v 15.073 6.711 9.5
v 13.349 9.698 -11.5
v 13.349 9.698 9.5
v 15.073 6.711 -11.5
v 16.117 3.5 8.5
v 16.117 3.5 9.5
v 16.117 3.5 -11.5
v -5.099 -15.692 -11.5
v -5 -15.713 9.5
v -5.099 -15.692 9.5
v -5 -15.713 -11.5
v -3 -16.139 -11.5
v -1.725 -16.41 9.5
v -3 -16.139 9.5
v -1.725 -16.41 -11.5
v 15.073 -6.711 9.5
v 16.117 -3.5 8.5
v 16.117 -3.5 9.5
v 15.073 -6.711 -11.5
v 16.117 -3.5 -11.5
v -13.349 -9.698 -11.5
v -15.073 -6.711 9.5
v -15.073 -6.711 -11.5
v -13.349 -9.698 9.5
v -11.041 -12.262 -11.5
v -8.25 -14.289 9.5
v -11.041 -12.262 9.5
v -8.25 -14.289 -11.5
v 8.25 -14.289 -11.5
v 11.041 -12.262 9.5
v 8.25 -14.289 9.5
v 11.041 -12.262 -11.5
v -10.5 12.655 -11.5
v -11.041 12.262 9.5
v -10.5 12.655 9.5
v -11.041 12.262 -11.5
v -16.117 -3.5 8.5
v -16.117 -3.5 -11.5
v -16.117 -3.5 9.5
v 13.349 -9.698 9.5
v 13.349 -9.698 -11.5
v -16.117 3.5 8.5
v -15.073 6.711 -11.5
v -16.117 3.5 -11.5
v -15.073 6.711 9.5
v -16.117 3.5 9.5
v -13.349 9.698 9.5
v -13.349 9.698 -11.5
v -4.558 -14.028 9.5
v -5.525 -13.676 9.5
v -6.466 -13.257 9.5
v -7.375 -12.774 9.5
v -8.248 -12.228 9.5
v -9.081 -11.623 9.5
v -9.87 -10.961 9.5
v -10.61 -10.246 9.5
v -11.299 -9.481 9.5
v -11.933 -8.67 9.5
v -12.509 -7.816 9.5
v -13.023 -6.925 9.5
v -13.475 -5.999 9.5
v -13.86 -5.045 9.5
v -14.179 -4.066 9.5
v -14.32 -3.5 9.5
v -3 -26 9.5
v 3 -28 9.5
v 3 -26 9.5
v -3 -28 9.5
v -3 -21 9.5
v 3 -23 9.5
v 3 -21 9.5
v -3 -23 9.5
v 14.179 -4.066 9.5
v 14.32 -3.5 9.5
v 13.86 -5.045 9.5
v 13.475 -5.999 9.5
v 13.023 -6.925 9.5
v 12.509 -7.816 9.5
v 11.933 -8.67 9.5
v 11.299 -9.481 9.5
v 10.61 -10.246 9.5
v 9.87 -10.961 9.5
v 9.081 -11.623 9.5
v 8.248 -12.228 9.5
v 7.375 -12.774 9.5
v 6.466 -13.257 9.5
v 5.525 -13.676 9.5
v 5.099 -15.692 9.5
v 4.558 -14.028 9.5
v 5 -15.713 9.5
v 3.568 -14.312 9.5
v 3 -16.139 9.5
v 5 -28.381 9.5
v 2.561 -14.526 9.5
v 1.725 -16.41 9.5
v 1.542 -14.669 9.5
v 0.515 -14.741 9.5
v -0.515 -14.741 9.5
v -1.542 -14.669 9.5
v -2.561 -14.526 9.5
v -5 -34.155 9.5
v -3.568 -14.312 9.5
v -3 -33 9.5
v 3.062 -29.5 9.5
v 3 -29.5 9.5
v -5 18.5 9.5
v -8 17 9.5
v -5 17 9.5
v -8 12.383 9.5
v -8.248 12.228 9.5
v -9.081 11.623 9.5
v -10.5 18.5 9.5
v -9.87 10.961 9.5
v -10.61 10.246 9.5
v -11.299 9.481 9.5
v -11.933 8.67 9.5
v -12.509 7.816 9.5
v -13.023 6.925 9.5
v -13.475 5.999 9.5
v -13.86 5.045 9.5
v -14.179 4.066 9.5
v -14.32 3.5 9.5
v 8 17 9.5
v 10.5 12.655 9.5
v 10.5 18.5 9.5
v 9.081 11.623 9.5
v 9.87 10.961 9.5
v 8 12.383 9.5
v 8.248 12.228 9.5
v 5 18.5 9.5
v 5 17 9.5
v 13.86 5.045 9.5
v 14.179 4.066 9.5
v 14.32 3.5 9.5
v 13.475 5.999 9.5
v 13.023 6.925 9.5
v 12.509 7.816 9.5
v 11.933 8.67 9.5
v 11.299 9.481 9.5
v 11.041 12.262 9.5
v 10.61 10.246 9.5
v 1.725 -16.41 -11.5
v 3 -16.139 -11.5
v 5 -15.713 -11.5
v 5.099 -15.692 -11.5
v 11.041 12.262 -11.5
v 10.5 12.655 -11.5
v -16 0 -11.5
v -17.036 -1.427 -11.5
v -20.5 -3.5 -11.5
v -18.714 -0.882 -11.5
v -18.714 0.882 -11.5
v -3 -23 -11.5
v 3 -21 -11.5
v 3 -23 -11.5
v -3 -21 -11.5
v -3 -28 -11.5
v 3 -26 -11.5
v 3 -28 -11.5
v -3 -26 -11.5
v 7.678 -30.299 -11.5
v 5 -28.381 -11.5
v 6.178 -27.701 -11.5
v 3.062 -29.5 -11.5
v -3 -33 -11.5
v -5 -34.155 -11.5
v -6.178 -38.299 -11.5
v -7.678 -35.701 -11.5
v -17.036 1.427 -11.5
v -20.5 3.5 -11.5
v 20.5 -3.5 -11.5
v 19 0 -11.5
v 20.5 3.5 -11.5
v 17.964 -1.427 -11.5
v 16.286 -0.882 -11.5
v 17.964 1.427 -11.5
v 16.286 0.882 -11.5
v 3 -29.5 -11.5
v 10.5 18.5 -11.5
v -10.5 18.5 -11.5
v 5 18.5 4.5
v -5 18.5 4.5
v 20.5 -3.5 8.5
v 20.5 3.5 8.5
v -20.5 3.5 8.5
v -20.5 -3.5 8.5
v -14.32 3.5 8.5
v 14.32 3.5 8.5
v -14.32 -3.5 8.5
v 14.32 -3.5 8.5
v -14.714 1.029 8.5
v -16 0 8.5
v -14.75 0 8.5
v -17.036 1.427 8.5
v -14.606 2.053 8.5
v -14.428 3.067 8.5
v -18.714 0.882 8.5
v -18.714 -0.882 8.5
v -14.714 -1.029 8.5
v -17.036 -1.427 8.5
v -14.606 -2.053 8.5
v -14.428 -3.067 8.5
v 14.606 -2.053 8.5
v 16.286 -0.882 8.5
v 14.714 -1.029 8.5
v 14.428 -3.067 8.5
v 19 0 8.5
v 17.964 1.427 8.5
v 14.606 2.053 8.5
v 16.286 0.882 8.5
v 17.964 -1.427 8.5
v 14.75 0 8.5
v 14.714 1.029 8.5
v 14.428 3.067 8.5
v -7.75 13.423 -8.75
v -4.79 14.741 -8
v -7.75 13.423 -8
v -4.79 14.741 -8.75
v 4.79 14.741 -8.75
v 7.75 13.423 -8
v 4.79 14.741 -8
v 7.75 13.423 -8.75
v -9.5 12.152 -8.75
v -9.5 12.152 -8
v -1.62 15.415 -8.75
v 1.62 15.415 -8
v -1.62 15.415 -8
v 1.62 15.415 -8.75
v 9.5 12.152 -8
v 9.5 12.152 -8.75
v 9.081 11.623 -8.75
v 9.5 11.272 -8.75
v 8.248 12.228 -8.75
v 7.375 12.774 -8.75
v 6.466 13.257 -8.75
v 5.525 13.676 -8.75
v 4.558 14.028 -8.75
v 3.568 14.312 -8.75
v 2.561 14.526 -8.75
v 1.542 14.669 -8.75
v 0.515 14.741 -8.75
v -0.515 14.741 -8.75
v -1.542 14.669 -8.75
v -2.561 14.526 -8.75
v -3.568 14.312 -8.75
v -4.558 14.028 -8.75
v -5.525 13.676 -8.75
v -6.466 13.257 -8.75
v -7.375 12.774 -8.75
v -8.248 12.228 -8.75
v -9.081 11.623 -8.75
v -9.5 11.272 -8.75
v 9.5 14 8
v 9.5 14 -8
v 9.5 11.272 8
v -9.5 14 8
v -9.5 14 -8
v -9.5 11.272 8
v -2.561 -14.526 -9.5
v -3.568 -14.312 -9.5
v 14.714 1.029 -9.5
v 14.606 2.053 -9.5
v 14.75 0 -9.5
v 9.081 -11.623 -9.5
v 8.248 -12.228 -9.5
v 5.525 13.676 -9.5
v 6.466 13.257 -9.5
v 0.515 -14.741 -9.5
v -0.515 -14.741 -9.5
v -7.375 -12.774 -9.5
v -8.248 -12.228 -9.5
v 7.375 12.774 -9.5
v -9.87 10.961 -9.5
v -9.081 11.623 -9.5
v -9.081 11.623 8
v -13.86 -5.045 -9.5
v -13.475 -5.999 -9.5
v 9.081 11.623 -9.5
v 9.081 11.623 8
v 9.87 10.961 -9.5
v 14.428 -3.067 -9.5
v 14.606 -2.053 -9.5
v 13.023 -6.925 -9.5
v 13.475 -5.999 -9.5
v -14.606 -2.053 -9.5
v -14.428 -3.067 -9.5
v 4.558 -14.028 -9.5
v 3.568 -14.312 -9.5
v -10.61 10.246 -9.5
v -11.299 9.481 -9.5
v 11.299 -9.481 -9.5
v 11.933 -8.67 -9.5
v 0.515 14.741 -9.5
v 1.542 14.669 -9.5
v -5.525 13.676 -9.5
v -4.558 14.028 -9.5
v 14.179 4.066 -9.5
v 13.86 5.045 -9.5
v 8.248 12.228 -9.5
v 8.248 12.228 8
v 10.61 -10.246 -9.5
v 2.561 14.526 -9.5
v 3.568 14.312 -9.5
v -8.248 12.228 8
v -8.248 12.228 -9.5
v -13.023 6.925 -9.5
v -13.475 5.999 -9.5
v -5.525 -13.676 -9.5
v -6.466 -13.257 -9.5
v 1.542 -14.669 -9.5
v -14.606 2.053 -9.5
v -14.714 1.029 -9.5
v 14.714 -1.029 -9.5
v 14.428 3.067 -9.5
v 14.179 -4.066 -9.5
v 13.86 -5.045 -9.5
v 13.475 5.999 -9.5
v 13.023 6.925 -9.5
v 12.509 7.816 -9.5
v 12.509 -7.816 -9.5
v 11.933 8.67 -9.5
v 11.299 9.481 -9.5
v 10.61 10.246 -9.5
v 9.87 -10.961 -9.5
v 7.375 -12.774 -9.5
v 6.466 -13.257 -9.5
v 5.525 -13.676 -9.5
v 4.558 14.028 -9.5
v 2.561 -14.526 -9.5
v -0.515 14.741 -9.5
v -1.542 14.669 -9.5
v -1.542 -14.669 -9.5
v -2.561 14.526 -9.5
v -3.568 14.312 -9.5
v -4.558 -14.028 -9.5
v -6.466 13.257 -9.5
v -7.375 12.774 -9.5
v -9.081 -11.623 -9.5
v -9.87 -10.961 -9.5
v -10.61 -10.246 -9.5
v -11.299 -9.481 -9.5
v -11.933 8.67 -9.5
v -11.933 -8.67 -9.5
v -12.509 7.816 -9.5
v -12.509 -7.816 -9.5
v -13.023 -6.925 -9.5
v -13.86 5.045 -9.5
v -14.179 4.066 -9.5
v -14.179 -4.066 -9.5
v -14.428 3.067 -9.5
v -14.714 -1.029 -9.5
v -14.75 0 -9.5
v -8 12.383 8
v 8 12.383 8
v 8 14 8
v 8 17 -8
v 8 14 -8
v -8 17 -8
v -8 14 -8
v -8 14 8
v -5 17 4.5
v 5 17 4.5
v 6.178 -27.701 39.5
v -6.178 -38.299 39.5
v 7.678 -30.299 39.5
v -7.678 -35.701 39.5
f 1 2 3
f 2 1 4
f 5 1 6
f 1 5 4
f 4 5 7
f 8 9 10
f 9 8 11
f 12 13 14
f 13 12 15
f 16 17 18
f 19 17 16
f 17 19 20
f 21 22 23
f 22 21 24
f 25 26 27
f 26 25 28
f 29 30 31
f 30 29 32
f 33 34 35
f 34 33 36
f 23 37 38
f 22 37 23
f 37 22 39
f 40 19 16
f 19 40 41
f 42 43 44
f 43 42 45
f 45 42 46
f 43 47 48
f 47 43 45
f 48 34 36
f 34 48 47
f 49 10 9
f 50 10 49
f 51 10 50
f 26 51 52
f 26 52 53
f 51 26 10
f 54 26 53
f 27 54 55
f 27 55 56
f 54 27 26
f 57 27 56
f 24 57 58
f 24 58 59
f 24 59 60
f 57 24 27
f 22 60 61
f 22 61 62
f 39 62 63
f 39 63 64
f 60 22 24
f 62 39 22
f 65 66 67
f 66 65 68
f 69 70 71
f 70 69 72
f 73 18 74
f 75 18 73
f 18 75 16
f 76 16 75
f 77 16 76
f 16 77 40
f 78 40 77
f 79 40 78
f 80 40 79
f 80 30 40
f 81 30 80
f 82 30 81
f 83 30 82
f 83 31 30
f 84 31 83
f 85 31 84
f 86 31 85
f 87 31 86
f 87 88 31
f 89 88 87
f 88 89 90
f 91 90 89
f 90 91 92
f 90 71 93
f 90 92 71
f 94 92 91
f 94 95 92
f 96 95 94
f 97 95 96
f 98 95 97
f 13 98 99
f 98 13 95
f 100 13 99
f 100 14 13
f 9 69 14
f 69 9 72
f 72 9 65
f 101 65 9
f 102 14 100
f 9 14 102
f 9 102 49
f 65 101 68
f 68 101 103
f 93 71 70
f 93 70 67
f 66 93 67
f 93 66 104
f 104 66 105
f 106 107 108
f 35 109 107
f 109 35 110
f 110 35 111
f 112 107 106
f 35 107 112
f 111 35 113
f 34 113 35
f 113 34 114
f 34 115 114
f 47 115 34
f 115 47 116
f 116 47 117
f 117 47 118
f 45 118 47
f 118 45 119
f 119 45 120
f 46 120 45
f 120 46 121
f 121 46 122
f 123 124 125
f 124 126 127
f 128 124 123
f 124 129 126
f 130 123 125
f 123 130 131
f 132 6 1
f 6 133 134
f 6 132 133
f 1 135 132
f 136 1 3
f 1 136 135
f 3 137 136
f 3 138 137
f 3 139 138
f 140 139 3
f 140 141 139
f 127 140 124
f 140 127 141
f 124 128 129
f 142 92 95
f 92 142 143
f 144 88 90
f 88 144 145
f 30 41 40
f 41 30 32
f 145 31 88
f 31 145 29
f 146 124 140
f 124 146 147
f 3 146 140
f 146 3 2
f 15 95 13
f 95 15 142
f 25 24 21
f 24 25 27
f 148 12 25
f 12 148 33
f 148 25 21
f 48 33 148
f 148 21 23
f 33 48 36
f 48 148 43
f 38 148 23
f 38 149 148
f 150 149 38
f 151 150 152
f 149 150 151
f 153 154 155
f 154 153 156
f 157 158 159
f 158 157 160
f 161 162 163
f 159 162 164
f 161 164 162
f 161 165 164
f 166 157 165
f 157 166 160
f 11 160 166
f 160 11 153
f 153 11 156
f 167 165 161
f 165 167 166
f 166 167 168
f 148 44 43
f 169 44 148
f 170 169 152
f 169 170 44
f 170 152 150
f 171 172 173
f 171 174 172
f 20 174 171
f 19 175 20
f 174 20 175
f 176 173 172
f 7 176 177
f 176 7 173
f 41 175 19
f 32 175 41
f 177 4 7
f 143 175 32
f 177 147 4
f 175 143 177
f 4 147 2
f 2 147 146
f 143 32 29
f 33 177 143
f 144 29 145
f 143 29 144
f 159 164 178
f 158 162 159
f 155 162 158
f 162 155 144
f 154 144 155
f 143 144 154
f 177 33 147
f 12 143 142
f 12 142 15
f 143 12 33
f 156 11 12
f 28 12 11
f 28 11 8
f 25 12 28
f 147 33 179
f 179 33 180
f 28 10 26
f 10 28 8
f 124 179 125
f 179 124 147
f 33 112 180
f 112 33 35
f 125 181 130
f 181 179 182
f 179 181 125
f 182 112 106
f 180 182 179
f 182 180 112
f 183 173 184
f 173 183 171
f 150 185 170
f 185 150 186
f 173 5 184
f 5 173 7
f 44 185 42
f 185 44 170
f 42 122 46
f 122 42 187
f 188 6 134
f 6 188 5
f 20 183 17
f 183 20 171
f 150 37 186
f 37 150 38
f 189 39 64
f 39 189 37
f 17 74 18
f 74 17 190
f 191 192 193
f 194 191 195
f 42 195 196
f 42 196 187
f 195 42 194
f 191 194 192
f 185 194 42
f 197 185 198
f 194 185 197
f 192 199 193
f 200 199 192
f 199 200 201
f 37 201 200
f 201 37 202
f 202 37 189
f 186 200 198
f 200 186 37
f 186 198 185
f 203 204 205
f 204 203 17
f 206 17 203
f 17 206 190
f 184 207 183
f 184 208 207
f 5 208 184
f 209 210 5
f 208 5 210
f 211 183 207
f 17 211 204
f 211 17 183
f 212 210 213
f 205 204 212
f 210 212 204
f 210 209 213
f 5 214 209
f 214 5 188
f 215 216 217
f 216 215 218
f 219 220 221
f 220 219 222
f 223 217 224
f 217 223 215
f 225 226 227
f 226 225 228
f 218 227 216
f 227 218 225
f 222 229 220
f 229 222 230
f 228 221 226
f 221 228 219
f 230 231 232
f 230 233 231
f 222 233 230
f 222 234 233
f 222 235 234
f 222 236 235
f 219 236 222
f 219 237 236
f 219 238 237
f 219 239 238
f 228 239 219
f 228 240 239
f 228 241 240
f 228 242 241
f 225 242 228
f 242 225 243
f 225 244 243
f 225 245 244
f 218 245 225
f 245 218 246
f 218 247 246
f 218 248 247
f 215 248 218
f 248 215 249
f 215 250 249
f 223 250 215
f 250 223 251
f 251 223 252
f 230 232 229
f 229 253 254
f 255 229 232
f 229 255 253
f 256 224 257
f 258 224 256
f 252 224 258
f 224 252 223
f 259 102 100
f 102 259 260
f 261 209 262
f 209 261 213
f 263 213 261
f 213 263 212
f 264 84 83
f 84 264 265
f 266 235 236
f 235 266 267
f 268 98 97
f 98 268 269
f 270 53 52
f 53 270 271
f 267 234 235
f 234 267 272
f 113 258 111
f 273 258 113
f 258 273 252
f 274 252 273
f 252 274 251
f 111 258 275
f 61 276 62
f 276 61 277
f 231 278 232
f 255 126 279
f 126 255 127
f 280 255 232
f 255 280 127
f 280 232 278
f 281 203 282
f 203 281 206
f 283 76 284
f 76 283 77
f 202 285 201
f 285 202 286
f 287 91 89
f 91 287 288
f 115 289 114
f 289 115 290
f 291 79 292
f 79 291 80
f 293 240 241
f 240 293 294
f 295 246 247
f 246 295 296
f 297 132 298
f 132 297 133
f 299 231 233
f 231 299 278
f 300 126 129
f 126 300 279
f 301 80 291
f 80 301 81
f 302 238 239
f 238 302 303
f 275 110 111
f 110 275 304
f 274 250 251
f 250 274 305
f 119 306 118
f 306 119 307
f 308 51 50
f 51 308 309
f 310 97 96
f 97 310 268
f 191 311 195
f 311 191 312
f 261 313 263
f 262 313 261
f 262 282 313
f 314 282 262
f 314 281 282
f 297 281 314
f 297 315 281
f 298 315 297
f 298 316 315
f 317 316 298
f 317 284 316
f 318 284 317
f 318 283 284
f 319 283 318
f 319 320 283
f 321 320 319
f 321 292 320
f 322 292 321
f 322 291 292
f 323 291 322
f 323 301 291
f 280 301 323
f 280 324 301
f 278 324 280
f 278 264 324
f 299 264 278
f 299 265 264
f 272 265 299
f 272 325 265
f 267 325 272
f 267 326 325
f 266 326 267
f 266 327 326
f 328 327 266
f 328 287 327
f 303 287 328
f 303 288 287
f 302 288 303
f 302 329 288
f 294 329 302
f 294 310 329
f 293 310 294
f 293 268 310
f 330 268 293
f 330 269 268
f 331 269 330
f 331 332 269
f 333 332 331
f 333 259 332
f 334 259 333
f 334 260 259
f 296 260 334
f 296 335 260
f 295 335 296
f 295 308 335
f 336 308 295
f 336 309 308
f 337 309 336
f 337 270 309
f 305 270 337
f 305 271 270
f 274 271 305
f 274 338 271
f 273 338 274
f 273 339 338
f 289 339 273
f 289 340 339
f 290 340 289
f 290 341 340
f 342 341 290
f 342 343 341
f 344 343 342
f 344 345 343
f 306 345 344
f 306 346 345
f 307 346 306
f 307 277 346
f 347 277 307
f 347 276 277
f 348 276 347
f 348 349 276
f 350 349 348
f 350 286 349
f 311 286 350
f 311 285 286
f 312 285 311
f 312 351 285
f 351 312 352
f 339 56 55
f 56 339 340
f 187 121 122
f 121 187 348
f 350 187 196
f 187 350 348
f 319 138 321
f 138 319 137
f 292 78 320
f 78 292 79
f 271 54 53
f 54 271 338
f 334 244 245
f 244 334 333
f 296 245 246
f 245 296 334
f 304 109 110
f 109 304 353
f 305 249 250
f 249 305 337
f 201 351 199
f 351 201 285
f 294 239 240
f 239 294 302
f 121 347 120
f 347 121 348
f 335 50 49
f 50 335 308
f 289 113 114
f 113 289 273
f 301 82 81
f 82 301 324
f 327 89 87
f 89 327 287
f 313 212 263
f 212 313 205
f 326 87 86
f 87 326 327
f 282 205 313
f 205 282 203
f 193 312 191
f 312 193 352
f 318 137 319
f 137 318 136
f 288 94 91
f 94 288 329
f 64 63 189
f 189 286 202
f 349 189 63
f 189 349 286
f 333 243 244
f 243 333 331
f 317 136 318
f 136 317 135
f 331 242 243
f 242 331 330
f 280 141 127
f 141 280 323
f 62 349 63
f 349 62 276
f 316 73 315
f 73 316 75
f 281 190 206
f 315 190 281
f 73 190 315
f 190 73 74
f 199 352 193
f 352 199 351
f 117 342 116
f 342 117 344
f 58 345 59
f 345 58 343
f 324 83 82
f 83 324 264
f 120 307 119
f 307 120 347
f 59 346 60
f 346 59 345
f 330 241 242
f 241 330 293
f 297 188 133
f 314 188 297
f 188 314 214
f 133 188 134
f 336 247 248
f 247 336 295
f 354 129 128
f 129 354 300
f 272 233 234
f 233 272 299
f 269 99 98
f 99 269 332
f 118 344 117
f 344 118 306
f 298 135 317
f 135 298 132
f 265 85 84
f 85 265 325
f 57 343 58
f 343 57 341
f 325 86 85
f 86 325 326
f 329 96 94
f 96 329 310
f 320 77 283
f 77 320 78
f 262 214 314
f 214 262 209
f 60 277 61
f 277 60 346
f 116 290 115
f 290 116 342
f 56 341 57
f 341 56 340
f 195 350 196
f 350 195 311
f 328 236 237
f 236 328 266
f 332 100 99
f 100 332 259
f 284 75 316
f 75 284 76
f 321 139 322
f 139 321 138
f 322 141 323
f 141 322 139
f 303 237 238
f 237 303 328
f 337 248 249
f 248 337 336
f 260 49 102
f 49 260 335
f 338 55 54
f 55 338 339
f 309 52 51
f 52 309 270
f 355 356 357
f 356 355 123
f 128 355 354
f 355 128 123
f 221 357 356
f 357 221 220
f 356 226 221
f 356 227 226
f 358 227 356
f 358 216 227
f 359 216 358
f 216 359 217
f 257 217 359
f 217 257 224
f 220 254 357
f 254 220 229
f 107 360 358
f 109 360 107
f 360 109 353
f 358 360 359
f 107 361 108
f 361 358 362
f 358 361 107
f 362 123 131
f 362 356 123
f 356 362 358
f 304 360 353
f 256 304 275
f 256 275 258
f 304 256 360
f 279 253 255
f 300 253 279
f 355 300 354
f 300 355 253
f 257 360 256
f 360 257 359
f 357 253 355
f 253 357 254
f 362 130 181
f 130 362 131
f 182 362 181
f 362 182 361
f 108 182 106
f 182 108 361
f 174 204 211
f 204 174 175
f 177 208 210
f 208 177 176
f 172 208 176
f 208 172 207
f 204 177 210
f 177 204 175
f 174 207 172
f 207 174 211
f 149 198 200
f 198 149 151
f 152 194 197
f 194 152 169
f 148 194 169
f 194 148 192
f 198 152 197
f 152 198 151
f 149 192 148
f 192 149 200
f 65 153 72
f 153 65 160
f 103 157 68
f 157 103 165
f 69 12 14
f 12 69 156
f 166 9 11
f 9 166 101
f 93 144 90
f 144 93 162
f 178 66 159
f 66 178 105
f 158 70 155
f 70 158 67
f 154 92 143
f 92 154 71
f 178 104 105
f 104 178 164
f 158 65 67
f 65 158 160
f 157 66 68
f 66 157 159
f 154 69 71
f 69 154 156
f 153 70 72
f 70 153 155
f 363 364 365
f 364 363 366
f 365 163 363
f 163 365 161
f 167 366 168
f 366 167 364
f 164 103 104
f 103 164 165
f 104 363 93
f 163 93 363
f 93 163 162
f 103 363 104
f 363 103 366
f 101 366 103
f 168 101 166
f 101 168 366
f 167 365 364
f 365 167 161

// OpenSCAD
// file: motor.scad
// model for 28BYJ-48 stepper and it's mount
// telepresence/stl/28BYJ-48-dimensions.png

mount_wall_th = 2;

cylinder_height = 19;
cylinder_d = 29;
windage = 0.5;
mount_hole_distance = 35;
mount_plank_width = 7;
holes_d = 4;
axis_offset = -8;
shaft_angle = 45;
shaft_len = 10;

module stepper() {
    // main body cylinder
    cylinder(d=cylinder_d+windage, h=cylinder_height, center=true, $fn=90);
    // shaft exit
    translate([0,axis_offset,cylinder_height/2+1.5/2]) cylinder(d=9, h=1.5, center=true, $fn=24);
    // shaft
    translate([0,axis_offset,cylinder_height/2+ shaft_len/2]) rotate([0,0,shaft_angle]) difference() {
        cylinder(d=5, h=10, center=true, $fn=12);
        // flat parts of axis
        translate([-500-3/2,0,shaft_len/2-6/2]) cube([1000,1000,6], center=true);
        translate([+500+3/2,0,shaft_len/2-6/2]) cube([1000,1000,6], center=true);
    }
    difference() {
        union() {
            // fastening plank
            translate([0,0,cylinder_height/2-1/2]) cube([35,mount_plank_width,1], center=true);
            // round ends of fastening plank
            translate([+35/2,0,cylinder_height/2-1/2]) cylinder(d=mount_plank_width, h=1, center=true);
            translate([-35/2,0,cylinder_height/2-1/2]) cylinder(d=mount_plank_width, h=1, center=true);
        }
        // holes to fasten motor
        translate([+35/2,0,0]) cylinder(d=holes_d, h=1000, center=true);
        translate([-35/2,0,0]) cylinder(d=holes_d, h=1000, center=true);
    }
    // control box
    translate([0,17/2,1.5/2]) cube([16,17,cylinder_height-1.5], center=true);
    translate([0,17/2,0]) cube([16+3,17-2*3,cylinder_height-3], center=true);
    intersection() {
        cylinder(d=cylinder_d+2, h=cylinder_height-1.5, center=true);
        translate([0,10,-5]) cube([16+3,cylinder_d+2,cylinder_height], center=true);
    }
}

module mount() {
    difference() {
        union() {
            translate([0,0,-1]) cylinder(d=cylinder_d+2*mount_wall_th, h=cylinder_height+mount_wall_th, center=true);
            translate([0,17/2,-2/2]) cube([17+4, 16+2*mount_wall_th,cylinder_height+mount_wall_th],center=true);
            //holes
            translate([0,0,-2/2]) cube([cylinder_d+12, 7, cylinder_height+2] , center=true);
            
            /*
            // projectile launcher connector
            translate([-2/2-3,-cylinder_d/2-10,-2/2]) cube([2,20,cylinder_height+2], center=true);
            translate([+2/2+3,-cylinder_d/2-15/2,-2/2]) cube([2,15,cylinder_height+2], center=true);
            // calibrate barrel angle, 3 plate thickness
            translate([0,axis_offset-15-2/2-3,-2/2]) cube([10,2,cylinder_height+2], center=true);
            //
            translate([0,axis_offset-14,-2/2]) cube([10,2,cylinder_height+2], center=true);
            */
        }
        stepper();
        // cut hole for stepper wires
        translate([0,cylinder_d/2,cylinder_height/2-5/2]) cube([10,10,5], center=true);
        //holes
        translate([+35/2,0,0]) cylinder(d=holes_d*0.75, h=100, center=true);
        translate([-35/2,0,0]) cylinder(d=holes_d*0.75, h=100, center=true);
        // drop parts that would go into stepper holes 
        translate([0,0,19/2-1/2]) cube([mount_hole_distance+mount_plank_width,7,1], center=true);
    }
}

*stepper();

*mount();

// gear that holds the barrel
*translate([0, axis_offset, 2 + cylinder_height/2 + 16/2]) cylinder(d=16, h=16, center=true);
// main file
include <motor.scad>

union() {
    mount();
    // projectile launcher connector
    translate([-2/2-3,-29/2-10,-2/2]) cube([2,20,19+2], center=true);
    translate([+2/2+3,-29/2-15/2,-2/2]) cube([2,15,19+2], center=true);
    // calibrate barrel angle, 3 plate thickness
    translate([0,-8-15-2/2-3,-2/2]) cube([10,2,19+2], center=true);
    //
    translate([0,-8-14,-2/2]) cube([10,2,19+2], center=true);
    // inclined projectile trigger, 3 is shoot plate thickness
    translate([0,-3/2-8-15-11/2-3,-2/2+30/2]) rotate([0,0,30]) cube([16, 3, 19+2+30],center=true);
}
// gear that holds the barrel
*translate([0, -8, 2 + 19/2 + 16/2]) cylinder(d=16, h=16, center=true);

//stepper();

// barrel
//*translate([0,-8,height/2 + 19/2 + 2 + 5]) rotate([180,0,360/10/2]) include <gun_barrel.scad>

// extra box to cool trigger layer
*translate([0,-3/2-8-15-11/2-3-10,-2/2+30/2]) rotate([0,0,30]) cube([16, 1, 19+2+30],center=true);

// check trigger distance
*translate([0,-10/2-8-14,0]) cube([10,10,100], center=true);
